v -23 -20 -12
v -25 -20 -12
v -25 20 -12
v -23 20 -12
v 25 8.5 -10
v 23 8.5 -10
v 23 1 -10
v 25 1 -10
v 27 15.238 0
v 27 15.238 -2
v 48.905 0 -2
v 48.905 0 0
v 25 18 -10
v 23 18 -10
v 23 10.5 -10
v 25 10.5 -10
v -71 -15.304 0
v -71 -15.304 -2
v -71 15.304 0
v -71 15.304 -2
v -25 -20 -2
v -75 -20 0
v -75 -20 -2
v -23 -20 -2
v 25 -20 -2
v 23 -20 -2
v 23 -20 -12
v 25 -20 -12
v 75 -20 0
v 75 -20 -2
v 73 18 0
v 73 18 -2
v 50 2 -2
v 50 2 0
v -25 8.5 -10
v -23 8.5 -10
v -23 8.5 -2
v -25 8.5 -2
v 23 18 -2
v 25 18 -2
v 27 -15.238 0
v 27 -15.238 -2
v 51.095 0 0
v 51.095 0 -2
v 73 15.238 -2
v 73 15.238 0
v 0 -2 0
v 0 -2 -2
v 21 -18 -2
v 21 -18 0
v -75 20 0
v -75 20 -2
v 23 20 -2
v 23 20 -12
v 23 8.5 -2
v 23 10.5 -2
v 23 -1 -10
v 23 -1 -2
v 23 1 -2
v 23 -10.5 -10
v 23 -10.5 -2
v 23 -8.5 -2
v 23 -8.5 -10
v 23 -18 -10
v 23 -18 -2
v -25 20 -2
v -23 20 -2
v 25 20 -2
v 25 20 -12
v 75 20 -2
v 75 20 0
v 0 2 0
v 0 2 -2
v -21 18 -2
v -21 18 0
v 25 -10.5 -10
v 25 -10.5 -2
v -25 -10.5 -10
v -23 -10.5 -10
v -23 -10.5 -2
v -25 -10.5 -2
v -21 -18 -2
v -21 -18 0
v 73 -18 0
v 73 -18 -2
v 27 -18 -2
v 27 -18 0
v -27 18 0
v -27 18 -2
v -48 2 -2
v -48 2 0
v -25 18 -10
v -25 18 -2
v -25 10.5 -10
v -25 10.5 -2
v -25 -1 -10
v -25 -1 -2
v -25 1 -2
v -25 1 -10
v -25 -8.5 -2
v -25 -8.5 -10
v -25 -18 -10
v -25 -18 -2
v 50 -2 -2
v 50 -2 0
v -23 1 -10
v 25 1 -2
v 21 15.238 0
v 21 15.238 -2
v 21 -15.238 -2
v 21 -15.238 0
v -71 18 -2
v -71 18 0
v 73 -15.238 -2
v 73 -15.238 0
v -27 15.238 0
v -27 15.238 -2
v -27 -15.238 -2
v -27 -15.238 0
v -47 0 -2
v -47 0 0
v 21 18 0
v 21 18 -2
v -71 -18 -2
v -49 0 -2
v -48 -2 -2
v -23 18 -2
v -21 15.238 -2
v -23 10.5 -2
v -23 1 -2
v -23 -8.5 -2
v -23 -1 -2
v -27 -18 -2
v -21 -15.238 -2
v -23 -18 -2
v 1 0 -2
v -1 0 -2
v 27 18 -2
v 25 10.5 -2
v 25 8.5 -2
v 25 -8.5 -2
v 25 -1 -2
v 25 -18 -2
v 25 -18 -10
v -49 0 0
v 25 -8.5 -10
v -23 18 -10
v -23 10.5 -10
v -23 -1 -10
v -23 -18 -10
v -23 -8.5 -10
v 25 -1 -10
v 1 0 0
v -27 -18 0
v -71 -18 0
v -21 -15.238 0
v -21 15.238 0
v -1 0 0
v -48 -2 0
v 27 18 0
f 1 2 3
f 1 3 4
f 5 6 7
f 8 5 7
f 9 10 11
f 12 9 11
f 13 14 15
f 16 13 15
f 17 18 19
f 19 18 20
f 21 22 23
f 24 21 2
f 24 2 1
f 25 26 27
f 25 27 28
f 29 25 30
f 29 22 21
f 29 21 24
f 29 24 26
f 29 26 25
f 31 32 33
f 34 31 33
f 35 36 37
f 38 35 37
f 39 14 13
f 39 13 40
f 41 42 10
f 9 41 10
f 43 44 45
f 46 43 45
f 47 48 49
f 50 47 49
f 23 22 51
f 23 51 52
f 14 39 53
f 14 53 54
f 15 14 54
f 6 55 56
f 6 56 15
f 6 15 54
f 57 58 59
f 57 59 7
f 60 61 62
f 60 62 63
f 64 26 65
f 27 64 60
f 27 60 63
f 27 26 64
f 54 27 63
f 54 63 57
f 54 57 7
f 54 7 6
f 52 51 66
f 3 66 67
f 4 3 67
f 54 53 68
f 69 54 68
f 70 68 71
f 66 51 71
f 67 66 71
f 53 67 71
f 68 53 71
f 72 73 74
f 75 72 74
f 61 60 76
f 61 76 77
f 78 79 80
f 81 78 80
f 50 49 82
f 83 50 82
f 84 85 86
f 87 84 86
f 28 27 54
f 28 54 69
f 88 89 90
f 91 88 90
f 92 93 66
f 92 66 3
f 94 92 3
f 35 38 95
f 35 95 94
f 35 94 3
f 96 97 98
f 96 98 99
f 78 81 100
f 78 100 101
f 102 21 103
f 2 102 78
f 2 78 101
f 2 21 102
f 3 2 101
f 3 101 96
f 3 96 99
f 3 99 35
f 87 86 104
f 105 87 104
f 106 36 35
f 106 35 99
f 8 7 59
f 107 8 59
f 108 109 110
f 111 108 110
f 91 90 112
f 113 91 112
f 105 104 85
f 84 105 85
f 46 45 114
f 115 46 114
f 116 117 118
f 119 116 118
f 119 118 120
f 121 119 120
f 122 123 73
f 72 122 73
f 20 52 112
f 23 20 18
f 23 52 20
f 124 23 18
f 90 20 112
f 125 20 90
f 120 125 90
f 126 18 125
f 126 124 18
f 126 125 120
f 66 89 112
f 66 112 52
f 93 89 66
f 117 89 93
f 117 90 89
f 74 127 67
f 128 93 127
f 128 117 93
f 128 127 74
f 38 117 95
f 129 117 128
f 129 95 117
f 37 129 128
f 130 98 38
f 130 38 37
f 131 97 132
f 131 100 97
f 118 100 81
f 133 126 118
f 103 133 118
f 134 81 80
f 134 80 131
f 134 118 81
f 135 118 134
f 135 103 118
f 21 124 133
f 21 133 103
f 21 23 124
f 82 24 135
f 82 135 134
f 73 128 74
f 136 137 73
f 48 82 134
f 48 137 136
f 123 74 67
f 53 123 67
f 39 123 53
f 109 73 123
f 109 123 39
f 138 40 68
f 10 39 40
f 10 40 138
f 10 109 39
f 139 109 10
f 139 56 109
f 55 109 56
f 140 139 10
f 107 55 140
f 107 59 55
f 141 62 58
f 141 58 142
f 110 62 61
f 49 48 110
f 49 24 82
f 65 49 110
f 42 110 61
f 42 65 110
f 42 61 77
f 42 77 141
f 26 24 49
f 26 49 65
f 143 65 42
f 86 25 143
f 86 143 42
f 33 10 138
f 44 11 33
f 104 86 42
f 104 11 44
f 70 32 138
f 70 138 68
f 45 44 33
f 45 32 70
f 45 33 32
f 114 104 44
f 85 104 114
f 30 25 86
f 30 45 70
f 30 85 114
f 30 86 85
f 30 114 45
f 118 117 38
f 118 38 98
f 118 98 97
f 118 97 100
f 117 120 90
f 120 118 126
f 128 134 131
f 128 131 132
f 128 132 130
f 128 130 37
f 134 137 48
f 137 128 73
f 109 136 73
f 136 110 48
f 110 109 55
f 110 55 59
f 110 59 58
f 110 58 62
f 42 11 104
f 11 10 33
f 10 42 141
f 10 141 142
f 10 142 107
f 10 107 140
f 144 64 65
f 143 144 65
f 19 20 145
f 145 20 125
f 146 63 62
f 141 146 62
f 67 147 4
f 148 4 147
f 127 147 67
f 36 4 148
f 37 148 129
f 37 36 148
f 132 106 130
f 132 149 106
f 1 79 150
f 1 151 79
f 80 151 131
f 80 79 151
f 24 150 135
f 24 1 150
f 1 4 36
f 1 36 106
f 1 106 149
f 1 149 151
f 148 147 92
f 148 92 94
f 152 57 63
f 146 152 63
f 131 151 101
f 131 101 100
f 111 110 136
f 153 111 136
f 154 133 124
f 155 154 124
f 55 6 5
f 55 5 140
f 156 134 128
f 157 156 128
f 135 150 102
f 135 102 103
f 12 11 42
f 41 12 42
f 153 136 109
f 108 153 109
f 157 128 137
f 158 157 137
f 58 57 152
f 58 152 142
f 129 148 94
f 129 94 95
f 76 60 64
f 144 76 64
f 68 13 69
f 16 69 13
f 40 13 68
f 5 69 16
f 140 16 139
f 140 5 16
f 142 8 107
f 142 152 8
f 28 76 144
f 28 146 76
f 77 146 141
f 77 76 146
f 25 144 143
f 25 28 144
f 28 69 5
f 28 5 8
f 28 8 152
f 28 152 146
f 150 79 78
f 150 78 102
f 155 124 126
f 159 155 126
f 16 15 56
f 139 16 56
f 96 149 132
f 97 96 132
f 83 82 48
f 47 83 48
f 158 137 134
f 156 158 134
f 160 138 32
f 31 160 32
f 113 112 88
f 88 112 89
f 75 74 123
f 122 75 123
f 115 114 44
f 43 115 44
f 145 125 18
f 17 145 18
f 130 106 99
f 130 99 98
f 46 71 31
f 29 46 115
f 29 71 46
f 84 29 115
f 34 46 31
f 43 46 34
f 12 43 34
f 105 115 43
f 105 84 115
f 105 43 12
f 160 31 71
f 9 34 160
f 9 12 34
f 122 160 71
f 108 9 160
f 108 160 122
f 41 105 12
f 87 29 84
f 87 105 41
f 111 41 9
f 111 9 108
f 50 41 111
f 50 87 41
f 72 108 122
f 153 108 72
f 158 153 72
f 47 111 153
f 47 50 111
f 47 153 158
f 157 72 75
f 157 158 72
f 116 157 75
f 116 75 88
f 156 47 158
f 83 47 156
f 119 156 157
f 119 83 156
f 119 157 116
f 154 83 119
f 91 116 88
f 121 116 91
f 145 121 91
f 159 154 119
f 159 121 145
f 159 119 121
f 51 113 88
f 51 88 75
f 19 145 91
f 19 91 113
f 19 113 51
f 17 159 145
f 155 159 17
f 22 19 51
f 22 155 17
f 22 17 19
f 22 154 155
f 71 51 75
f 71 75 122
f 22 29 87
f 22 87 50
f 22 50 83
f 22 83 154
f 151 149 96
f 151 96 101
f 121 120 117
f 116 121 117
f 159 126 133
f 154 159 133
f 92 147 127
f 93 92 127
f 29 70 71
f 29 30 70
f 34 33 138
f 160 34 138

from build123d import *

# Parameters (mm, degrees)
F1_DEPTH      = 20
F3_DEPTH      = 2
F4_W          = 7.5
F4_H          = 8
F5_DEPTH      = 2
F5_DEPTH_BACK = 48


with BuildPart() as f1:
    # F0 (on Front) → F1 (new body, symmetric)
    with BuildSketch(Plane.XZ):
        Polygon((75, 0), (-75, 0), (-75, -2), (-25, -2), (-25, -12), (-23, -12), (-23, -2), (23, -2), (23, -12), (25, -12), (25, -2), (75, -2), align=None)
    extrude(amount=F1_DEPTH, both=True)

    # F2 (on face) → F3 (cut, through all)
    with BuildSketch(Plane(origin=(0, 0, -2), x_dir=(1, 0, 0), z_dir=(0, 0, -1))):
        Polygon((-27, 18), (-71, 18), (-48, 2), align=None)
        Polygon((21, 18), (-21, 18), (0, 2), align=None)
        Polygon((73, 18), (27, 18), (50, 2), align=None)
        Polygon((-27, -18), (-48, -2), (-71, -18), align=None)
        Polygon((21, -18), (0, -2), (-21, -18), align=None)
        Polygon((73, -18), (50, -2), (27, -18), align=None)
        Polygon((-49, 0), (-71, 15.3043478261), (-71, -15.3043478261), align=None)
        Polygon((-27, -15.2380952381), (-27, 15.2380952381), (-47, 0), align=None)
        Polygon((-1, 0), (-21, 15.2380952381), (-21, -15.2380952381), align=None)
        Polygon((21, -15.2380952381), (21, 15.2380952381), (1, 0), align=None)
        Polygon((48.9047619048, 0), (27, 15.2380952381), (27, -15.2380952381), align=None)
        Polygon((73, -15.2380952381), (73, 15.2380952381), (51.0952380952, 0), align=None)
    extrude(amount=-F3_DEPTH, mode=Mode.SUBTRACT)

    # F4 (on face) → F5 (cut, two sides)
    with BuildSketch(Plane(origin=(23, 0, 0), x_dir=(0, -1, 0), z_dir=(-1, 0, 0))) as f5_sk:
        with Locations((14.25, -6)):
            Rectangle(F4_W, F4_H)
        with Locations((4.75, -6)):
            Rectangle(F4_W, F4_H)
        with Locations((-4.75, -6)):
            Rectangle(F4_W, F4_H)
        with Locations((-14.25, -6)):
            Rectangle(F4_W, F4_H)
    extrude(amount=-F5_DEPTH, mode=Mode.SUBTRACT)
    extrude(f5_sk.sketch, amount=F5_DEPTH_BACK, mode=Mode.SUBTRACT)


solid = f1.part
